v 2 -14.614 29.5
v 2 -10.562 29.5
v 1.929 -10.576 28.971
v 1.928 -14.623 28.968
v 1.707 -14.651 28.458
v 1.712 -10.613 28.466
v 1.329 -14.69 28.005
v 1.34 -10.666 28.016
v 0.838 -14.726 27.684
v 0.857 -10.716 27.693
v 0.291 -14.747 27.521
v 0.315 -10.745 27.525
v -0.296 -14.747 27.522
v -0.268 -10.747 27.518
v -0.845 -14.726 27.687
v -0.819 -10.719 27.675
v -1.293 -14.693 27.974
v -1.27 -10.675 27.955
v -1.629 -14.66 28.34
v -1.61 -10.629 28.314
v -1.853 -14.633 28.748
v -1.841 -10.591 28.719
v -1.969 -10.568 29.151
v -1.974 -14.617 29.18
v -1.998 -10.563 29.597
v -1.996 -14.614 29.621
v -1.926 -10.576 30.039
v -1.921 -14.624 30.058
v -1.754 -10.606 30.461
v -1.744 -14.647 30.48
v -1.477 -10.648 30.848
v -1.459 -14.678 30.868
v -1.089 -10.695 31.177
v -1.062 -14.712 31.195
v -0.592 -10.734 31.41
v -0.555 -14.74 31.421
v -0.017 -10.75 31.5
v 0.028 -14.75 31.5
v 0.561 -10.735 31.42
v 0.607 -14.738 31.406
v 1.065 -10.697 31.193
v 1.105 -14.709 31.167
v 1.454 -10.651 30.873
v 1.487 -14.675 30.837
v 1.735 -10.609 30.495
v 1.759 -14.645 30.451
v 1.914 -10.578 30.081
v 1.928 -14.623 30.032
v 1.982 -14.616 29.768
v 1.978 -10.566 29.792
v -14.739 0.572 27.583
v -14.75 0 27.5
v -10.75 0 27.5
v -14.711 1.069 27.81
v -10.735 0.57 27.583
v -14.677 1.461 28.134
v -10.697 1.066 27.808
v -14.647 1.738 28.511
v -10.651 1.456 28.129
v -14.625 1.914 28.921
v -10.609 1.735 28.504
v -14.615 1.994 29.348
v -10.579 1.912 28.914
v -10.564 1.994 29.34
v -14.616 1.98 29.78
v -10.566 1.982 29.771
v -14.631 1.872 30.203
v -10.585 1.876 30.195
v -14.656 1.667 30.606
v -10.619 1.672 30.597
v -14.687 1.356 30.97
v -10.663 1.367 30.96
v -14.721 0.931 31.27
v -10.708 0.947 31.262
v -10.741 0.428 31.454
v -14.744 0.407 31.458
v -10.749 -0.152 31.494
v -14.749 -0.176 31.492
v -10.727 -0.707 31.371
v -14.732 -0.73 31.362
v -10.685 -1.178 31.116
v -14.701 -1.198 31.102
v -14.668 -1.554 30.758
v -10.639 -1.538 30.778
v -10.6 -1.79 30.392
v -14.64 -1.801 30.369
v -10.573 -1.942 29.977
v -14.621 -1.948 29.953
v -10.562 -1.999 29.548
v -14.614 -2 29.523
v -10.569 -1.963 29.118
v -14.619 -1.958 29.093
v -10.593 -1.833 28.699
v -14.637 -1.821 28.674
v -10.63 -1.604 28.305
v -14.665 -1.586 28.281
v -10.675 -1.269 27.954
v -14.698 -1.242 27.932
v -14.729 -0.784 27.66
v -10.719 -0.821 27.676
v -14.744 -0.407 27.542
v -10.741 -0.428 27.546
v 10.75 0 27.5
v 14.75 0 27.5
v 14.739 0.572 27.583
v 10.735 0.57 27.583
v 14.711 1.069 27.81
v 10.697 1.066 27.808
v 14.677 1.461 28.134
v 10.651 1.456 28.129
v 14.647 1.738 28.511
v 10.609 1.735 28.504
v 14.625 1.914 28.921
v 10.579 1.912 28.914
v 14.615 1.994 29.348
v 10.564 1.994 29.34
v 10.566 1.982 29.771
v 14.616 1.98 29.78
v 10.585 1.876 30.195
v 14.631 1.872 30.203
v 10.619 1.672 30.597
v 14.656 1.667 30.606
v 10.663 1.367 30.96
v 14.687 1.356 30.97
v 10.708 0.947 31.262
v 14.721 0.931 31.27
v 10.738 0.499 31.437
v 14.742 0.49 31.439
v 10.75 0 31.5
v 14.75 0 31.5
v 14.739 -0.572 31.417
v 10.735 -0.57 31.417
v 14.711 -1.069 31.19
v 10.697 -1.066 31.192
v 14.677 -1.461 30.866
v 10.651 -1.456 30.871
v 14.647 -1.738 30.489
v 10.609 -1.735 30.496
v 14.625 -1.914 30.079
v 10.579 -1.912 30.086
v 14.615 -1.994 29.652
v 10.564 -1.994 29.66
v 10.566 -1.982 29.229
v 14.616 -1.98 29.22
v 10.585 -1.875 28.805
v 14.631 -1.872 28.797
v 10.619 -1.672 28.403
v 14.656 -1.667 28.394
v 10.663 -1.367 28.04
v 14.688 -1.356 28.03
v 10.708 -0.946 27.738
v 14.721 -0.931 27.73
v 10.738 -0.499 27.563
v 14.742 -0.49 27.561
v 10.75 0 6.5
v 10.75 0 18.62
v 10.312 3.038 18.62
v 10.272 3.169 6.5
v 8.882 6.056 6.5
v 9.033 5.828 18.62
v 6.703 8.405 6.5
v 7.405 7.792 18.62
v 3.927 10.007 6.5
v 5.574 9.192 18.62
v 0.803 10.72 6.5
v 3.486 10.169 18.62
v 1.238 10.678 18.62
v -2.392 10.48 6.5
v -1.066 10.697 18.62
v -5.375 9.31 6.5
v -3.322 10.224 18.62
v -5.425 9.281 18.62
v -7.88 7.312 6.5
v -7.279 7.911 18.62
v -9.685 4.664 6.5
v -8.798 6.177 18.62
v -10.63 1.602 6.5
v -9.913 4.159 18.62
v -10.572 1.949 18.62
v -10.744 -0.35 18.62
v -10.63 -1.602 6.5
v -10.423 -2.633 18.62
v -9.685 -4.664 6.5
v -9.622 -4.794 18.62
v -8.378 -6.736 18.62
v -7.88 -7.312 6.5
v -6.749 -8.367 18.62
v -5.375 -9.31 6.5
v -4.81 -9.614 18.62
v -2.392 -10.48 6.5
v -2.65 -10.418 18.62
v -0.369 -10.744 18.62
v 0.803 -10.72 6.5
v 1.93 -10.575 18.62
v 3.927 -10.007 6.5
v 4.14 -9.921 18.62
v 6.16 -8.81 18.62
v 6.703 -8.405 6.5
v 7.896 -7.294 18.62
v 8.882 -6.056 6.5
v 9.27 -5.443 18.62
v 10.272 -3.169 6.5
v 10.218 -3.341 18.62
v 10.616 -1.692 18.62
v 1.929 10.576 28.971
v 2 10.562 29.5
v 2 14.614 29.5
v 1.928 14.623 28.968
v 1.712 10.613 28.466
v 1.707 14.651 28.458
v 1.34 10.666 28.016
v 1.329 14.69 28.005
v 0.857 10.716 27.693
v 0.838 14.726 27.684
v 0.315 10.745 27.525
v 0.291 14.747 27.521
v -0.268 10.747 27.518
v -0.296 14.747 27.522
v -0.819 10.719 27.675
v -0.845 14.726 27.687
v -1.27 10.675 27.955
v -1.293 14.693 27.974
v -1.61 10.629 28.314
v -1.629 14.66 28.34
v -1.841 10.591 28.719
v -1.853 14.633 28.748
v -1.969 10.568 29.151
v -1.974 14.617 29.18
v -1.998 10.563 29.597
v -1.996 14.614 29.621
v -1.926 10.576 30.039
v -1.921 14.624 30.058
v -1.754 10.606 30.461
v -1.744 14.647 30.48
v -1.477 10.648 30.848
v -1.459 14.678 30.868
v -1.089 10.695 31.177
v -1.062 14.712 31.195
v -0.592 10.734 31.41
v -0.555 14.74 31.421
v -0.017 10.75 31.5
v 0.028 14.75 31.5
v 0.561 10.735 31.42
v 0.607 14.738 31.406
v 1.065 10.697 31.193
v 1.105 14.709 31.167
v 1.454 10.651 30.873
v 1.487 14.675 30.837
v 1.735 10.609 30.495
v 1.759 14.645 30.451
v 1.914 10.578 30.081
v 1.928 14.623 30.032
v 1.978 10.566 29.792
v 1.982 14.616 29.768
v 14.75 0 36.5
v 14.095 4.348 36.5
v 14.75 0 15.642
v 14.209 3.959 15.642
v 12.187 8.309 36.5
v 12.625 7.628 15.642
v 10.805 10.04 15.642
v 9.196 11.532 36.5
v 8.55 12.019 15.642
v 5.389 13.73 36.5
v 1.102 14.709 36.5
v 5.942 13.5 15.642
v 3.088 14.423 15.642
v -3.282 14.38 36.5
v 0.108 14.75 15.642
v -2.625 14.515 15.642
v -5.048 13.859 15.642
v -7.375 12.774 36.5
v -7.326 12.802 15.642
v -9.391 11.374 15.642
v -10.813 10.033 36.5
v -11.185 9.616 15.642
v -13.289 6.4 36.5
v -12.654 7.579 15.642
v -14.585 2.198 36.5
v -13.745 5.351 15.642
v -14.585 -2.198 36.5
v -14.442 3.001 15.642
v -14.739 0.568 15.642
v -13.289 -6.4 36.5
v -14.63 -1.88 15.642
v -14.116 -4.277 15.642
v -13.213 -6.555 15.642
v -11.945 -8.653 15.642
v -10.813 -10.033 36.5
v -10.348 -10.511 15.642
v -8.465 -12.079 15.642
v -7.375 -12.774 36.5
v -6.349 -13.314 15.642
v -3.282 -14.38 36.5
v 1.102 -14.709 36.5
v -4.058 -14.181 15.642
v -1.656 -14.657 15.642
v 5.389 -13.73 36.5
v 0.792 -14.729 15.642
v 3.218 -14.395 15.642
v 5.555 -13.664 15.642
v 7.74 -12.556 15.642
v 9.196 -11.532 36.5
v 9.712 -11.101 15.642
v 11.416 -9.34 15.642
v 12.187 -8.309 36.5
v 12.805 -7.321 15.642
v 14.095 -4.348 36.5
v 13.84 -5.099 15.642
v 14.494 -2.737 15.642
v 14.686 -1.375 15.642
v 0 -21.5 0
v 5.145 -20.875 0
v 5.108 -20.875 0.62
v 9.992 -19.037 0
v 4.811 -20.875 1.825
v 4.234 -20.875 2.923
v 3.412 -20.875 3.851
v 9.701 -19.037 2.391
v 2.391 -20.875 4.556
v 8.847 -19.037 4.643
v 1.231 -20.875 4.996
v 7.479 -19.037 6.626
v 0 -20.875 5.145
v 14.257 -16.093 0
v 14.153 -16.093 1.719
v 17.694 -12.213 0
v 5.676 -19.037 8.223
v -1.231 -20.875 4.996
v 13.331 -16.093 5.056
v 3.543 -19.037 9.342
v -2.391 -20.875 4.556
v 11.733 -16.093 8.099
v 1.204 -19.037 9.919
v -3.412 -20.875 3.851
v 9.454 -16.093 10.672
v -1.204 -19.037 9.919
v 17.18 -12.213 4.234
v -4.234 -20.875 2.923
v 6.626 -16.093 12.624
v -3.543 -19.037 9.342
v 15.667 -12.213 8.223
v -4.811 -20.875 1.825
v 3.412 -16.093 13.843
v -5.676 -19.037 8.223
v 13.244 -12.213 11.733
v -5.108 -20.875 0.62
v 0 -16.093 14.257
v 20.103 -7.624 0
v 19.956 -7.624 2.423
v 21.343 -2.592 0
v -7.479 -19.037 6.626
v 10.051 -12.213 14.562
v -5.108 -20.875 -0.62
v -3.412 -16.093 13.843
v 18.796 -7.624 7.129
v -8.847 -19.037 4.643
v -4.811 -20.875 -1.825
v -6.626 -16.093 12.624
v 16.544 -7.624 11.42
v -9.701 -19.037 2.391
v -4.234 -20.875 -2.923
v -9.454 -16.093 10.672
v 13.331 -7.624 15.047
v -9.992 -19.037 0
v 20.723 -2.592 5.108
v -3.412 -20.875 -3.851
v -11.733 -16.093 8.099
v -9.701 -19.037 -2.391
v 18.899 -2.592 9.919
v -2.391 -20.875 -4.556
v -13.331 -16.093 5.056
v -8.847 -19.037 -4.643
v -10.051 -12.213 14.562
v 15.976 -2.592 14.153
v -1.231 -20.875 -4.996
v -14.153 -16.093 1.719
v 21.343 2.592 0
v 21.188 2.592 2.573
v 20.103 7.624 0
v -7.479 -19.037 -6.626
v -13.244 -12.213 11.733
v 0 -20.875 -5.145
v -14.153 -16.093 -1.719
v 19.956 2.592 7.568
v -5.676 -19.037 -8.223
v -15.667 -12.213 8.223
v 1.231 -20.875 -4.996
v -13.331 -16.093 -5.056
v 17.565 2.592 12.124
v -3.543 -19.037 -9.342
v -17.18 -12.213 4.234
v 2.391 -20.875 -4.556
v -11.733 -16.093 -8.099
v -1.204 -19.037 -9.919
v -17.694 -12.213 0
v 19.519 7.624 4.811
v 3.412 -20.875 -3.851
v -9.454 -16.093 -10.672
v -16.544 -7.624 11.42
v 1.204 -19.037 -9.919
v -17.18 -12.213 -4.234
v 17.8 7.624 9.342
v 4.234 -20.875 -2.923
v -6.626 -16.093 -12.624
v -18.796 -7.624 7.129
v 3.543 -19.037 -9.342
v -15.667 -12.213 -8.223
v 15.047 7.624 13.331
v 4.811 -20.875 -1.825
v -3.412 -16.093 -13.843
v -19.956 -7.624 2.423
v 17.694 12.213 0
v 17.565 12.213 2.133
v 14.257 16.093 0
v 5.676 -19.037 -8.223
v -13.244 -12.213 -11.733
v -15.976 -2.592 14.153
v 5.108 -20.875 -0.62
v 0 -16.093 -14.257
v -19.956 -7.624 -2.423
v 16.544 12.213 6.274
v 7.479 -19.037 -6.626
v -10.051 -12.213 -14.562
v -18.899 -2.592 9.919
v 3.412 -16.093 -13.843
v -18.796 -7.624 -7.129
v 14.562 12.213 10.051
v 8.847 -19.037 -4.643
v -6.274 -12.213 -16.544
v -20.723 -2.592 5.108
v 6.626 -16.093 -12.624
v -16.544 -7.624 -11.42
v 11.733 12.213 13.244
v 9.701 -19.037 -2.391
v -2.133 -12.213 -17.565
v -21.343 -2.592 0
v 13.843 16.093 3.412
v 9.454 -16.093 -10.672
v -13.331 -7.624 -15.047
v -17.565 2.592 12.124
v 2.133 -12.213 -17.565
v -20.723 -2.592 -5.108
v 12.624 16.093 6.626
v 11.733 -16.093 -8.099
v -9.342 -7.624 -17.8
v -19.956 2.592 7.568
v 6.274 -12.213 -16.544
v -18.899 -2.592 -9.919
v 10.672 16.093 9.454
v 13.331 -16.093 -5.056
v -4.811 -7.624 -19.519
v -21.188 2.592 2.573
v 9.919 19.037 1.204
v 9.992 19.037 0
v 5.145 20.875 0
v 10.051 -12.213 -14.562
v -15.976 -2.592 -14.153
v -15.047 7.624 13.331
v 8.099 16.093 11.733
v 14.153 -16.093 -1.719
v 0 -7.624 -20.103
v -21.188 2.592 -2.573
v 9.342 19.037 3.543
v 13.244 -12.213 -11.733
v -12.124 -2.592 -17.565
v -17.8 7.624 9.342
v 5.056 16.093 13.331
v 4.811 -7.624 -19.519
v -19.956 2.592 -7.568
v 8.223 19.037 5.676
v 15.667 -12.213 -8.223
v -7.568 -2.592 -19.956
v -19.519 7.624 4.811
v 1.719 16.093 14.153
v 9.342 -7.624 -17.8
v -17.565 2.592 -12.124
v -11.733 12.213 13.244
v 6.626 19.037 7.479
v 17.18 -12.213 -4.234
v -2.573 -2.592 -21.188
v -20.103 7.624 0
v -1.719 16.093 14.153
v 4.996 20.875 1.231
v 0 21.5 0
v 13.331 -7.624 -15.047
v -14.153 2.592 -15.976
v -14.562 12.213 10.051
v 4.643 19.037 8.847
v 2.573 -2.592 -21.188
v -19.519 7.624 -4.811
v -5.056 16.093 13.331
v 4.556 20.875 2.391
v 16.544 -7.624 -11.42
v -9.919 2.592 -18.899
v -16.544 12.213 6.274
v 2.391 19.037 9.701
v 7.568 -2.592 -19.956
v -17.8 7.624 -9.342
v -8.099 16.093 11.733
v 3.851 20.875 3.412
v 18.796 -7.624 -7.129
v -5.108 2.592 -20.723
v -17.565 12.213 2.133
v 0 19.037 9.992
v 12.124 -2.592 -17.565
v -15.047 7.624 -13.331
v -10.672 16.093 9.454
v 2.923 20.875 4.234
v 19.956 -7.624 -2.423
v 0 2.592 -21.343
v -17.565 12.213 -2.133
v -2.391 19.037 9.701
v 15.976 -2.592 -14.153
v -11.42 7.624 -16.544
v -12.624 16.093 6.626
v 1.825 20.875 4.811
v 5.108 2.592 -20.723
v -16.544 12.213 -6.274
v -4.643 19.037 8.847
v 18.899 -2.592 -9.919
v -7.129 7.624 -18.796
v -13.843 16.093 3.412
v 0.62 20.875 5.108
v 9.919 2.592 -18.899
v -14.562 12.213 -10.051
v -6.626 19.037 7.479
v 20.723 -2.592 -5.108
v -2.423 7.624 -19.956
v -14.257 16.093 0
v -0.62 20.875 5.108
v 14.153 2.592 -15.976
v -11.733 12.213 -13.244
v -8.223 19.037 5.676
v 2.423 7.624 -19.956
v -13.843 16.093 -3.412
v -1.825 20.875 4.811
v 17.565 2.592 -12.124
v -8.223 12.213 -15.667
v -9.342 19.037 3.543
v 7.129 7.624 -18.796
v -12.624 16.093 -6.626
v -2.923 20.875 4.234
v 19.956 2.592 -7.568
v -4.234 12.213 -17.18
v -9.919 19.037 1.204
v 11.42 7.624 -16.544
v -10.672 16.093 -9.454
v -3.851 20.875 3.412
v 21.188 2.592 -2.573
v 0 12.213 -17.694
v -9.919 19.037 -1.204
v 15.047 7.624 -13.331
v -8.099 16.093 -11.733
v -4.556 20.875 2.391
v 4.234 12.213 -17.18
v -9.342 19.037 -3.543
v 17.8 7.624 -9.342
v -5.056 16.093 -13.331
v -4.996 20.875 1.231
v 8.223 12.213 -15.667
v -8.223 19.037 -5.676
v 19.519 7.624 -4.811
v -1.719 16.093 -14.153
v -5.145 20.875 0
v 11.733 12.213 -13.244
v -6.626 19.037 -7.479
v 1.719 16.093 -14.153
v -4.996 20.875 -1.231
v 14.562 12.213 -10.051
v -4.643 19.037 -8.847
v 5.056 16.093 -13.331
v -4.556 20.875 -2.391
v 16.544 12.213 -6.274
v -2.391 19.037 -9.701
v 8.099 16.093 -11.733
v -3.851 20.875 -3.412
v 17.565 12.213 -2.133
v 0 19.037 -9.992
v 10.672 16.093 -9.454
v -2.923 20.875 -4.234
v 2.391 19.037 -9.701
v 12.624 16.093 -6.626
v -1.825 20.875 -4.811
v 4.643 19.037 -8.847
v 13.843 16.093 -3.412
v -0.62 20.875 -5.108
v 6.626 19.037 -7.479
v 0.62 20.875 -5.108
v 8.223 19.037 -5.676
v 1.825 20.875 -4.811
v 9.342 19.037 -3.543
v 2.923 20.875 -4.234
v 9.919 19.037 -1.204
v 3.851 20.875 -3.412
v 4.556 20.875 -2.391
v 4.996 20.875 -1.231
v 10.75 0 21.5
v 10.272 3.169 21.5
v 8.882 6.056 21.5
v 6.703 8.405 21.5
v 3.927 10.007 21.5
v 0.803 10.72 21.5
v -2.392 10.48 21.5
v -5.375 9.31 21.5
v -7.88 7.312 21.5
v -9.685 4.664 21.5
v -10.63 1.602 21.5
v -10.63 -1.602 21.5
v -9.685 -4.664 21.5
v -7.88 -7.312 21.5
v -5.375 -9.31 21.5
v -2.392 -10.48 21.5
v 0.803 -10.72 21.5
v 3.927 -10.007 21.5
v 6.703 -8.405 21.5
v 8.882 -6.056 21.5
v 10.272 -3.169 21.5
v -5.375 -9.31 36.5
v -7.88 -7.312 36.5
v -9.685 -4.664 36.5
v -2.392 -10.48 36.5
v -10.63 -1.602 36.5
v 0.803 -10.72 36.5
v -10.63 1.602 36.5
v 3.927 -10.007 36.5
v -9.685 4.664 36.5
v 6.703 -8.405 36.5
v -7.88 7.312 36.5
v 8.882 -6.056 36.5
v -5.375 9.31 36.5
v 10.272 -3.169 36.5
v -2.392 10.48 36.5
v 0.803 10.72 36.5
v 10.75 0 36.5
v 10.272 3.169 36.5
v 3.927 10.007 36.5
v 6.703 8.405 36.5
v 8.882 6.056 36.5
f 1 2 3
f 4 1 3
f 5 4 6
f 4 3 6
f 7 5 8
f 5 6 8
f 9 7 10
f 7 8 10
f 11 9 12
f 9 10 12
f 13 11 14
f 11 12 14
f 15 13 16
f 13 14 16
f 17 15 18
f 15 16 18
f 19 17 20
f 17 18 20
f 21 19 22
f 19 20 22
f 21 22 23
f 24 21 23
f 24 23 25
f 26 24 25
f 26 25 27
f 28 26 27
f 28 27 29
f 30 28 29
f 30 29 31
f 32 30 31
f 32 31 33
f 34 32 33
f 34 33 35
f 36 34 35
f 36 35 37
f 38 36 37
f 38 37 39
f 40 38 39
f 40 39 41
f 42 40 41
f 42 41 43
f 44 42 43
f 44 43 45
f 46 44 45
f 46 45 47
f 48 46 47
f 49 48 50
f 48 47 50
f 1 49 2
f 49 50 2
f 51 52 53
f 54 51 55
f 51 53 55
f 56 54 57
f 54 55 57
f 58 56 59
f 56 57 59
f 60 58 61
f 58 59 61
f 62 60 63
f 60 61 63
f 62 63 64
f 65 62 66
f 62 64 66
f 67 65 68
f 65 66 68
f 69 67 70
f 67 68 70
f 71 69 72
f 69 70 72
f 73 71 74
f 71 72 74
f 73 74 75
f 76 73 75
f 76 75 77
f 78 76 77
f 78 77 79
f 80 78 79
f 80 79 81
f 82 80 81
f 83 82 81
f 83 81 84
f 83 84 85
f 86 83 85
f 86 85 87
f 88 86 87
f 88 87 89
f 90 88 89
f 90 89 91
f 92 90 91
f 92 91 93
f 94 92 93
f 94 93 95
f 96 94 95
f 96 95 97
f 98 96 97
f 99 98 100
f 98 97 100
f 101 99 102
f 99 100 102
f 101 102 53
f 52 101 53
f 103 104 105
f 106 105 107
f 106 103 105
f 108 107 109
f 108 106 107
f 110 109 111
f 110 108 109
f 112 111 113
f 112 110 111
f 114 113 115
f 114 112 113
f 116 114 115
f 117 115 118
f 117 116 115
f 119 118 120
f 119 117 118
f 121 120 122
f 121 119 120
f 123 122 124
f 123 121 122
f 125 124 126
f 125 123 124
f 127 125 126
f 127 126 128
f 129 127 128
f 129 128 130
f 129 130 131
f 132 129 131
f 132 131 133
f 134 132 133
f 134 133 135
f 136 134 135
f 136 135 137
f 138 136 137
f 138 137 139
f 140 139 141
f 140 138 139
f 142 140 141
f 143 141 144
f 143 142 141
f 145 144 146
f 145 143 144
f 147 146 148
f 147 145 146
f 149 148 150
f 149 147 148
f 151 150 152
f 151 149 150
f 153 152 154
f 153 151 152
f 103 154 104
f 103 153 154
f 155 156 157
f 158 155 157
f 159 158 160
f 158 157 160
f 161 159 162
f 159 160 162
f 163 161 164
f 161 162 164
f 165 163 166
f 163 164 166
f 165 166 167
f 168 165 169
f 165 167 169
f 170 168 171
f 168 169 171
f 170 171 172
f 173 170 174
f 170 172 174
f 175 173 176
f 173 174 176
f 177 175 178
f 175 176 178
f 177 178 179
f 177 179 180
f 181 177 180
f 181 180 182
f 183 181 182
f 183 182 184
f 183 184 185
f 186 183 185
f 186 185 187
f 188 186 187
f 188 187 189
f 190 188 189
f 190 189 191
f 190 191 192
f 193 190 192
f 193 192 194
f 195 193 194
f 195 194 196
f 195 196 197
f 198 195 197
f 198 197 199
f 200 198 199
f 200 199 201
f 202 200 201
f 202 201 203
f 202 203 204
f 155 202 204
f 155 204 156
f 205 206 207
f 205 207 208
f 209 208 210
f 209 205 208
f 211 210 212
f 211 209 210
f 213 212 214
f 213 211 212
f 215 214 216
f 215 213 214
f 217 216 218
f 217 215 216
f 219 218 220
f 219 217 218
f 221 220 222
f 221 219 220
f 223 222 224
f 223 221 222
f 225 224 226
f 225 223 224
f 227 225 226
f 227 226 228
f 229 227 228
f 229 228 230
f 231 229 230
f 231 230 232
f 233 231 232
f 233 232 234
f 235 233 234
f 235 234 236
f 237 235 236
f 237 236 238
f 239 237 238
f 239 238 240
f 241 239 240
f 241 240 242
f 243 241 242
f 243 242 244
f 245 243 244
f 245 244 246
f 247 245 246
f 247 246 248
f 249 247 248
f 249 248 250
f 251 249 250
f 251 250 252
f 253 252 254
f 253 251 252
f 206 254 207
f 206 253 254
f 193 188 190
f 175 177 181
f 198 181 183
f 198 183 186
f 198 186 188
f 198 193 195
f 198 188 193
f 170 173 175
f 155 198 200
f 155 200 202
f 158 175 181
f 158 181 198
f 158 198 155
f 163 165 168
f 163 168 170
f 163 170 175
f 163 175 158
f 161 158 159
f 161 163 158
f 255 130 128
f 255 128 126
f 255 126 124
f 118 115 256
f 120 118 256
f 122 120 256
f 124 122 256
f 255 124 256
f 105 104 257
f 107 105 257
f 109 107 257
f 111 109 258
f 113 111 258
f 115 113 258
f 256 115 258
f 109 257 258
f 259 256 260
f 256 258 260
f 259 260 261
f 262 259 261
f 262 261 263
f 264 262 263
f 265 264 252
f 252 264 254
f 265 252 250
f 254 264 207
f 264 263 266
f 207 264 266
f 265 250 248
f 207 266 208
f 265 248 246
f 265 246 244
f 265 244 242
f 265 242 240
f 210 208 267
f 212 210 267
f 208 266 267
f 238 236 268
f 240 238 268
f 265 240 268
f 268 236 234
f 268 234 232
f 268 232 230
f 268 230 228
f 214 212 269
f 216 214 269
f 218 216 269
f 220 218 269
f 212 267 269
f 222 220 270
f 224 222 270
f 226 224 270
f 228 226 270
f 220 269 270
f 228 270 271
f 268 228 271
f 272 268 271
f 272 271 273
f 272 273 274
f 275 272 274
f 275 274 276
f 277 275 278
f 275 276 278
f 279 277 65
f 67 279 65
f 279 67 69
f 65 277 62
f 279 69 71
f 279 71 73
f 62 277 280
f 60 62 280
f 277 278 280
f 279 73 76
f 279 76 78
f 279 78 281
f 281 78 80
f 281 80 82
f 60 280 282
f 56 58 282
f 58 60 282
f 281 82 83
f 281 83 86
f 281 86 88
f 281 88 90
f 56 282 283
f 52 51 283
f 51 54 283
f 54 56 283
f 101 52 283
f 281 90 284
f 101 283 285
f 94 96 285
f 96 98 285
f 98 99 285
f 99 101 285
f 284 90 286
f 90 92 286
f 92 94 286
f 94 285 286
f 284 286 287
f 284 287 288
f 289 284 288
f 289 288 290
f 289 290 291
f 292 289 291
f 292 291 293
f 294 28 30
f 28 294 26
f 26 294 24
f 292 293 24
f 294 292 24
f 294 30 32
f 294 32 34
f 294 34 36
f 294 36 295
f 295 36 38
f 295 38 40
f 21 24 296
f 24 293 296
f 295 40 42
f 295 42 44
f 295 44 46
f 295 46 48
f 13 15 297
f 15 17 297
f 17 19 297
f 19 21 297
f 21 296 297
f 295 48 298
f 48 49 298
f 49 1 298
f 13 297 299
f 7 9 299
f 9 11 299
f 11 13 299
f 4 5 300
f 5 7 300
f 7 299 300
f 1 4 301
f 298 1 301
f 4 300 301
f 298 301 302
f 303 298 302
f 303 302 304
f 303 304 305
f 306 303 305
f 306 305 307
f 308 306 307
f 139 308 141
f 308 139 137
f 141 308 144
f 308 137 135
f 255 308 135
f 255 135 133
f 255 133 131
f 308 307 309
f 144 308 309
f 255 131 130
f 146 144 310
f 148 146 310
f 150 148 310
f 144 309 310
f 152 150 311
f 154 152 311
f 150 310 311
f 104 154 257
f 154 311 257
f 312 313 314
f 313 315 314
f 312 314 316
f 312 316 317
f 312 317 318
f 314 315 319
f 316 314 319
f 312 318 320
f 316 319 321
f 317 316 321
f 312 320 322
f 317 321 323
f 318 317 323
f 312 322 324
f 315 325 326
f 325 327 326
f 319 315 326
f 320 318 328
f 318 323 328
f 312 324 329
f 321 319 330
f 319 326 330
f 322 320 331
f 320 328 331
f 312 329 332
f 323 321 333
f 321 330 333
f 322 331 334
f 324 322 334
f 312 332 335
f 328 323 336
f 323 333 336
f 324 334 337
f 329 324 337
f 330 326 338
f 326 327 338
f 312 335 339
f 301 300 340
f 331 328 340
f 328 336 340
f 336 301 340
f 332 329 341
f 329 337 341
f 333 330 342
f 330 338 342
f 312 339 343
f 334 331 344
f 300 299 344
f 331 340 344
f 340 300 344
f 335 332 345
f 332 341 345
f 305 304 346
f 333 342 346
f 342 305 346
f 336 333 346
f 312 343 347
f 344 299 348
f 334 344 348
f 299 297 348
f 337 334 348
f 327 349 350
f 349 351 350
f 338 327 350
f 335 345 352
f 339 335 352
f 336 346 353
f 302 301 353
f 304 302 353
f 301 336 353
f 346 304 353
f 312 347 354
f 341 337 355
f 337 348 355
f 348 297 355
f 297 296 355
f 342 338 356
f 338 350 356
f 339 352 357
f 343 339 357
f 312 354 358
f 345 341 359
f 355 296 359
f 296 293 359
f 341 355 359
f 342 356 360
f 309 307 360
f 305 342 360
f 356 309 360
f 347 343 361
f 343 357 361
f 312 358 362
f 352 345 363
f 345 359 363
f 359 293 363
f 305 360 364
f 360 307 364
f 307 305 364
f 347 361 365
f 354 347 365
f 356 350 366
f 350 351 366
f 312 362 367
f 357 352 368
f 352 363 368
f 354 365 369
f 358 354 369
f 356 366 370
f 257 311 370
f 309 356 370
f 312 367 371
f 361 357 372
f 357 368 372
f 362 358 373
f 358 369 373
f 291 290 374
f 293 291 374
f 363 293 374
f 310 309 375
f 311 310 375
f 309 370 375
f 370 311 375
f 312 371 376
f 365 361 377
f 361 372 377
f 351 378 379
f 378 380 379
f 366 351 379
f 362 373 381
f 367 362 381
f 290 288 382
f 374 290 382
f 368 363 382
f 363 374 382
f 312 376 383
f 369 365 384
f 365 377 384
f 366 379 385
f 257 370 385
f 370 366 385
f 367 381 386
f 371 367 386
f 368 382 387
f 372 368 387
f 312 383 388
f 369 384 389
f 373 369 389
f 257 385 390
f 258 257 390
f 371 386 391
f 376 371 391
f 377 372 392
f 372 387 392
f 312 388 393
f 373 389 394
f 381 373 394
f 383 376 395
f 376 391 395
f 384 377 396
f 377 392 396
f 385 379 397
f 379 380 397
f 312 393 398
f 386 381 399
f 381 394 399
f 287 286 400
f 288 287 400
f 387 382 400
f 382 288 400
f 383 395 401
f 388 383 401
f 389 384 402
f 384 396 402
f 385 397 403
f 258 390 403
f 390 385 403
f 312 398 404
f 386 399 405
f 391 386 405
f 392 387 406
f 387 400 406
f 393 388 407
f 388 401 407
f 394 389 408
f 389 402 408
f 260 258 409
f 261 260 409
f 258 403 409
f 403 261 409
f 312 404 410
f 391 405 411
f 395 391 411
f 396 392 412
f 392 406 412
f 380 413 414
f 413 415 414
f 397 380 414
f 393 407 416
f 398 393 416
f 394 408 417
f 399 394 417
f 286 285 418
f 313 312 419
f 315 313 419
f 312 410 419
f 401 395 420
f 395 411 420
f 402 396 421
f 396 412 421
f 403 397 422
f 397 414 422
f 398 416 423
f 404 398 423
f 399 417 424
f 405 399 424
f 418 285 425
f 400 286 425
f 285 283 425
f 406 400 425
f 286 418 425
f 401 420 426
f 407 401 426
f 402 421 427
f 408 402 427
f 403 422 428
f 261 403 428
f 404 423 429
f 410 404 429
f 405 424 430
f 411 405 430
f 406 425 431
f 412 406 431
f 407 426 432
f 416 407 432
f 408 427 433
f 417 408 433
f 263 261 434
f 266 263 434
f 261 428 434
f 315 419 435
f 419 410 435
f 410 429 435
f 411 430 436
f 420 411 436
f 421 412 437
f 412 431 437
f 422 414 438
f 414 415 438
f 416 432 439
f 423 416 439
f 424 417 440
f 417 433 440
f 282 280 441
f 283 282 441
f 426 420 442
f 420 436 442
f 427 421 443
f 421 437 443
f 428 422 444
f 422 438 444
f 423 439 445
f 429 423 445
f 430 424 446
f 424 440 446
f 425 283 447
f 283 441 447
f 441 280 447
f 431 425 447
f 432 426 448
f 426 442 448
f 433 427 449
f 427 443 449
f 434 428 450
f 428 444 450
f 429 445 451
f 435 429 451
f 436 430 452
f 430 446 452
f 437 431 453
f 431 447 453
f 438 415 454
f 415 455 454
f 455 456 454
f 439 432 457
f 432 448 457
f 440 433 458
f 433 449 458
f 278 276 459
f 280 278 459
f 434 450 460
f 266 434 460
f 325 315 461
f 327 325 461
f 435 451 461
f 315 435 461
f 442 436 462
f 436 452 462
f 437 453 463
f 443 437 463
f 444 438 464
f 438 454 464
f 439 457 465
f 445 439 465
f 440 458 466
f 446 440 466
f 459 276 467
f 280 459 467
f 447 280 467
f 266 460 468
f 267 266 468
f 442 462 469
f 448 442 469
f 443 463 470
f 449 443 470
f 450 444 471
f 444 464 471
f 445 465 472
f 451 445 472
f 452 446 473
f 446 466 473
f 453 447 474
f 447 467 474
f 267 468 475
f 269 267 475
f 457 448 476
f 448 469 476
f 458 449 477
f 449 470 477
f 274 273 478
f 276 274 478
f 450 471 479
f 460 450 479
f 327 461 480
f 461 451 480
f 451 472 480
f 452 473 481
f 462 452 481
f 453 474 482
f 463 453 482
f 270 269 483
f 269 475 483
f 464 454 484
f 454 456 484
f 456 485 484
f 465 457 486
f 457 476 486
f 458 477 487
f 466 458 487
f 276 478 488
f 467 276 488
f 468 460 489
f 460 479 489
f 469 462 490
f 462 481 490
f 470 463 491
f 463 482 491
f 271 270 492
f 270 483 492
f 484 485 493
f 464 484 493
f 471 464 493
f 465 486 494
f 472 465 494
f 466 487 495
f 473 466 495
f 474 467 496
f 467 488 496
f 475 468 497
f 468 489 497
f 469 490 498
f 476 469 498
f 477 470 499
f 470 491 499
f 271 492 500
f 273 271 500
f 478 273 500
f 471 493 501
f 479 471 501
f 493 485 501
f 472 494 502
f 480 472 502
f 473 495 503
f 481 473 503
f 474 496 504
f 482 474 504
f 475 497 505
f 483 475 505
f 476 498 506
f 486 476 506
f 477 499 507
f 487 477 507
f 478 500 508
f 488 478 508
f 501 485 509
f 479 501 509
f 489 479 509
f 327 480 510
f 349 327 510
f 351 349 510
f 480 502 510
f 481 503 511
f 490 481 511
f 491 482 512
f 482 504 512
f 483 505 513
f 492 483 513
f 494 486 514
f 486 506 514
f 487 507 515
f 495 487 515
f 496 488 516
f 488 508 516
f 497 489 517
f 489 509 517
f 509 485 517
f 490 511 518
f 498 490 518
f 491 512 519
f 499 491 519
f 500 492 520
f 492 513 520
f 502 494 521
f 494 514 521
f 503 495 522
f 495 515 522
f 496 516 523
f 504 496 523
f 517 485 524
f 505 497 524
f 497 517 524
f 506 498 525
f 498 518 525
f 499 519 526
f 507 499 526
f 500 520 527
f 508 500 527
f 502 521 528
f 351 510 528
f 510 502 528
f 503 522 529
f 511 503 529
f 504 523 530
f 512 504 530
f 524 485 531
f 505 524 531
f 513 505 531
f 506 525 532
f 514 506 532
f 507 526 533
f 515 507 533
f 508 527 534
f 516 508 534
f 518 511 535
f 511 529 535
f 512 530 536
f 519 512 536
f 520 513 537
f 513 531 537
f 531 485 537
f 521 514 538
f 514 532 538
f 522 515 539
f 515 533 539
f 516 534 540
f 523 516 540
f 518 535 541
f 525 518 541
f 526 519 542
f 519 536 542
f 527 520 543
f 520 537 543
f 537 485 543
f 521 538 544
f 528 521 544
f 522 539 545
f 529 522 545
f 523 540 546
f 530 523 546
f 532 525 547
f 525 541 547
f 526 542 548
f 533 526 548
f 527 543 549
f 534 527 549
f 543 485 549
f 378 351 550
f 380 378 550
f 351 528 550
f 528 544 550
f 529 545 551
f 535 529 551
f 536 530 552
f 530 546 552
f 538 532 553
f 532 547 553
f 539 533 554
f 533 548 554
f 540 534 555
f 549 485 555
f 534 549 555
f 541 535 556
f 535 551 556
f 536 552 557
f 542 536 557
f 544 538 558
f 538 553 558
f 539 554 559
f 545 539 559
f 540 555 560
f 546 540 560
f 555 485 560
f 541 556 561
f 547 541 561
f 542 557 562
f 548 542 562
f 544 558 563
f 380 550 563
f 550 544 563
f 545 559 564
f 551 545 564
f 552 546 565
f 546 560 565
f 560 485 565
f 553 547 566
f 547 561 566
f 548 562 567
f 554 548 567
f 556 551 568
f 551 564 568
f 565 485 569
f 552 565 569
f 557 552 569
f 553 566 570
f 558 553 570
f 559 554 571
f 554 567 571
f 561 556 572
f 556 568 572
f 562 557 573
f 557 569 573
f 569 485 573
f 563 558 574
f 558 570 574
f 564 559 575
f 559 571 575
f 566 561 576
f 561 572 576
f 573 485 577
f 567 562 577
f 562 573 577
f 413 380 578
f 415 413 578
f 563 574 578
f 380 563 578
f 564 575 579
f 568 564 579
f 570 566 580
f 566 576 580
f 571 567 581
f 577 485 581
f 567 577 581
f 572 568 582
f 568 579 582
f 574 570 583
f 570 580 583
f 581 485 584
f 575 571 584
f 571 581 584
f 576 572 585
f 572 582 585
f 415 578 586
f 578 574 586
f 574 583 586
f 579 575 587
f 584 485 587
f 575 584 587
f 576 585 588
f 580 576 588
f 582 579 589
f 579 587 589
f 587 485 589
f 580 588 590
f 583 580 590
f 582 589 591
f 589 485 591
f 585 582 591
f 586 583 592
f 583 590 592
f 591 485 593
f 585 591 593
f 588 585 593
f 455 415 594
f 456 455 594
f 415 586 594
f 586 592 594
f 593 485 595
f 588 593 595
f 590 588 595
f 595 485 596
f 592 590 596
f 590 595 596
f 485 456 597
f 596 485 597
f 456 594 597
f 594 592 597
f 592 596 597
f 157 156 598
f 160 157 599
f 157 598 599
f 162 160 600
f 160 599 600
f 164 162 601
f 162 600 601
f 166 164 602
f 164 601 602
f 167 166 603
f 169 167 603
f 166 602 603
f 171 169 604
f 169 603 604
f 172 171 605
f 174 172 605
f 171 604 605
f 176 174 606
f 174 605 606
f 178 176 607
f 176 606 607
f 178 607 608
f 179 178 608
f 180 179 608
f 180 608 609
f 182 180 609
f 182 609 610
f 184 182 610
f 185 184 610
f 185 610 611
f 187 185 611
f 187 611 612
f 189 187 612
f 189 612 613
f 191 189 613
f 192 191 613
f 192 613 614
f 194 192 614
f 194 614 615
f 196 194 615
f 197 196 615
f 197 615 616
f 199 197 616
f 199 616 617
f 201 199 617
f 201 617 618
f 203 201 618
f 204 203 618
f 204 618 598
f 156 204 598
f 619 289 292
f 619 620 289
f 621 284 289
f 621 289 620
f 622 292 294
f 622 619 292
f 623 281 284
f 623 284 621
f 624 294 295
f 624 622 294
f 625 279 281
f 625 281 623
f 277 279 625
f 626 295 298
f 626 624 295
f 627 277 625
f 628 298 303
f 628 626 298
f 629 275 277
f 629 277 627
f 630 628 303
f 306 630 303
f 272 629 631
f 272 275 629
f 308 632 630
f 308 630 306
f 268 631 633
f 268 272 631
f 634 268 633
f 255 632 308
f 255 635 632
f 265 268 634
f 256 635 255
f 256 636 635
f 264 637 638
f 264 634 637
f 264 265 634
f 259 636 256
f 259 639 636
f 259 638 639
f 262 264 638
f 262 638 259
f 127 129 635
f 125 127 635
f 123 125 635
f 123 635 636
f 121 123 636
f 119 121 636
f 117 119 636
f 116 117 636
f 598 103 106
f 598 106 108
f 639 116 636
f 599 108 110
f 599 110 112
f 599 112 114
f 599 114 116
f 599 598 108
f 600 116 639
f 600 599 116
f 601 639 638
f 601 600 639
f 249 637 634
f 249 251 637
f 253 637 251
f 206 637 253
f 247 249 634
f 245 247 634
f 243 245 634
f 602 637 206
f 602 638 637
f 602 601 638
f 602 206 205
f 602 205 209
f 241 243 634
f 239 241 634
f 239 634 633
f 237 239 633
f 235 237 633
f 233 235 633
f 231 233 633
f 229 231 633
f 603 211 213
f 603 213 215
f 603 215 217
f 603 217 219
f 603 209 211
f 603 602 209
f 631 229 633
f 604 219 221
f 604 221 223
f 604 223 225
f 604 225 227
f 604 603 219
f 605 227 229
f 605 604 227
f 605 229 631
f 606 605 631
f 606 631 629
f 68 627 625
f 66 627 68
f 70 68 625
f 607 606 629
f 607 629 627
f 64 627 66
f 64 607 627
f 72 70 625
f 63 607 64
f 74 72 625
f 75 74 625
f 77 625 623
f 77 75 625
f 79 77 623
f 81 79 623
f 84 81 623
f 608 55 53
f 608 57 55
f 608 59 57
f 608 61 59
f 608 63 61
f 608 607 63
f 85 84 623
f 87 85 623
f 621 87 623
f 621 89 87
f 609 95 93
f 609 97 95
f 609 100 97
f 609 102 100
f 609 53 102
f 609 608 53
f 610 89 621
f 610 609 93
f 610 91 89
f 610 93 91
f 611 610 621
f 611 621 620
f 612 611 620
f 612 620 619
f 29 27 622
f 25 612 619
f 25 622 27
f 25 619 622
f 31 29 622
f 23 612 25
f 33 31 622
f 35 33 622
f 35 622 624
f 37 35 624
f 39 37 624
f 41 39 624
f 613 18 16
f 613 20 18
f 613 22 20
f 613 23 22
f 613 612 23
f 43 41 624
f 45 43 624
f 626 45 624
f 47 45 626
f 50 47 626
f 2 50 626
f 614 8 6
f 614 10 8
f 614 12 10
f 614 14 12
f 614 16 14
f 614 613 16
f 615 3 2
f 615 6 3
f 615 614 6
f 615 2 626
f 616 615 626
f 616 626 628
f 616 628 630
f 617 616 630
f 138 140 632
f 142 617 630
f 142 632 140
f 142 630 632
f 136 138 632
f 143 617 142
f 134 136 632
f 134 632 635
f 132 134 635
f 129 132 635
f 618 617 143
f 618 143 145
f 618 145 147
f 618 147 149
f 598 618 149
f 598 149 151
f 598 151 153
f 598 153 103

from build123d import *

# Parameters (mm, degrees)
SKETCH2_R               = 10.75
CUT_EXTRUDE1_DEPTH      = 15
BOSS_EXTRUDE1_REACH     = 45
SKETCH3_R               = 14.75
SKETCH3_R_2             = 10.75
SKETCH4_R               = 14.75
SKETCH4_R_2             = 10.75
BOSS_EXTRUDE2_DEPTH     = 15
SKETCH5_R               = 2
CUT_EXTRUDE2_DEPTH      = 22.5
CUT_EXTRUDE2_DEPTH_BACK = 22.5
SKETCH7_R               = 2
CUT_EXTRUDE3_DEPTH      = 22.5
CUT_EXTRUDE3_DEPTH_BACK = 22.5


with BuildPart() as part:
    # Sketch1 → Revolve1 (revolve)
    with BuildSketch(Plane.XY):
        with BuildLine():
            Line((0, 21.5), (0, -21.5))
            ThreePointArc((0, -21.5), (21.5, 0), (0, 21.5))
        make_face()
    revolve(axis=Axis((0, 21.5, 0), (0, -1, 0)))

    # Sketch2 → Cut-Extrude1 (cut)
    with BuildSketch(Plane.XY.offset(21.5)):
        Circle(SKETCH2_R)
    extrude(amount=-CUT_EXTRUDE1_DEPTH, mode=Mode.SUBTRACT)

    # Sketch3 → Boss-Extrude1 (add, up to next)
    with BuildSketch(Plane.XY.offset(21.5), mode=Mode.PRIVATE) as boss_extrude1_sk1:
        Circle(SKETCH3_R)
        Circle(SKETCH3_R_2, mode=Mode.SUBTRACT)
    boss_extrude1_tool1 = extrude(boss_extrude1_sk1.sketch, amount=-BOSS_EXTRUDE1_REACH, mode=Mode.PRIVATE) - part.part
    add(boss_extrude1_tool1.solids().sort_by_distance((-14.332807, 0, 21.5))[0])

    # Sketch4 → Boss-Extrude2 (add)
    with BuildSketch(Plane.XY.offset(21.5)):
        Circle(SKETCH4_R)
        Circle(SKETCH4_R_2, mode=Mode.SUBTRACT)
    extrude(amount=BOSS_EXTRUDE2_DEPTH)

    # Sketch5 → Cut-Extrude2 (cut, two sides)
    with BuildSketch(Plane(origin=(0, 0, 0), x_dir=(1, 0, 0), z_dir=(0, 1, 0))) as cut_extrude2_sk:
        with Locations((0, -29.5)):
            Circle(SKETCH5_R)
    extrude(amount=CUT_EXTRUDE2_DEPTH, mode=Mode.SUBTRACT)
    extrude(cut_extrude2_sk.sketch, amount=-CUT_EXTRUDE2_DEPTH_BACK, mode=Mode.SUBTRACT)

    # Sketch7 → Cut-Extrude3 (cut, two sides)
    with BuildSketch(Plane(origin=(0, 0, 0), x_dir=(0, 0, -1), z_dir=(1, 0, 0))) as cut_extrude3_sk:
        with Locations((-29.5, 0)):
            Circle(SKETCH7_R)
    extrude(amount=CUT_EXTRUDE3_DEPTH, mode=Mode.SUBTRACT)
    extrude(cut_extrude3_sk.sketch, amount=-CUT_EXTRUDE3_DEPTH_BACK, mode=Mode.SUBTRACT)


solid = part.part
